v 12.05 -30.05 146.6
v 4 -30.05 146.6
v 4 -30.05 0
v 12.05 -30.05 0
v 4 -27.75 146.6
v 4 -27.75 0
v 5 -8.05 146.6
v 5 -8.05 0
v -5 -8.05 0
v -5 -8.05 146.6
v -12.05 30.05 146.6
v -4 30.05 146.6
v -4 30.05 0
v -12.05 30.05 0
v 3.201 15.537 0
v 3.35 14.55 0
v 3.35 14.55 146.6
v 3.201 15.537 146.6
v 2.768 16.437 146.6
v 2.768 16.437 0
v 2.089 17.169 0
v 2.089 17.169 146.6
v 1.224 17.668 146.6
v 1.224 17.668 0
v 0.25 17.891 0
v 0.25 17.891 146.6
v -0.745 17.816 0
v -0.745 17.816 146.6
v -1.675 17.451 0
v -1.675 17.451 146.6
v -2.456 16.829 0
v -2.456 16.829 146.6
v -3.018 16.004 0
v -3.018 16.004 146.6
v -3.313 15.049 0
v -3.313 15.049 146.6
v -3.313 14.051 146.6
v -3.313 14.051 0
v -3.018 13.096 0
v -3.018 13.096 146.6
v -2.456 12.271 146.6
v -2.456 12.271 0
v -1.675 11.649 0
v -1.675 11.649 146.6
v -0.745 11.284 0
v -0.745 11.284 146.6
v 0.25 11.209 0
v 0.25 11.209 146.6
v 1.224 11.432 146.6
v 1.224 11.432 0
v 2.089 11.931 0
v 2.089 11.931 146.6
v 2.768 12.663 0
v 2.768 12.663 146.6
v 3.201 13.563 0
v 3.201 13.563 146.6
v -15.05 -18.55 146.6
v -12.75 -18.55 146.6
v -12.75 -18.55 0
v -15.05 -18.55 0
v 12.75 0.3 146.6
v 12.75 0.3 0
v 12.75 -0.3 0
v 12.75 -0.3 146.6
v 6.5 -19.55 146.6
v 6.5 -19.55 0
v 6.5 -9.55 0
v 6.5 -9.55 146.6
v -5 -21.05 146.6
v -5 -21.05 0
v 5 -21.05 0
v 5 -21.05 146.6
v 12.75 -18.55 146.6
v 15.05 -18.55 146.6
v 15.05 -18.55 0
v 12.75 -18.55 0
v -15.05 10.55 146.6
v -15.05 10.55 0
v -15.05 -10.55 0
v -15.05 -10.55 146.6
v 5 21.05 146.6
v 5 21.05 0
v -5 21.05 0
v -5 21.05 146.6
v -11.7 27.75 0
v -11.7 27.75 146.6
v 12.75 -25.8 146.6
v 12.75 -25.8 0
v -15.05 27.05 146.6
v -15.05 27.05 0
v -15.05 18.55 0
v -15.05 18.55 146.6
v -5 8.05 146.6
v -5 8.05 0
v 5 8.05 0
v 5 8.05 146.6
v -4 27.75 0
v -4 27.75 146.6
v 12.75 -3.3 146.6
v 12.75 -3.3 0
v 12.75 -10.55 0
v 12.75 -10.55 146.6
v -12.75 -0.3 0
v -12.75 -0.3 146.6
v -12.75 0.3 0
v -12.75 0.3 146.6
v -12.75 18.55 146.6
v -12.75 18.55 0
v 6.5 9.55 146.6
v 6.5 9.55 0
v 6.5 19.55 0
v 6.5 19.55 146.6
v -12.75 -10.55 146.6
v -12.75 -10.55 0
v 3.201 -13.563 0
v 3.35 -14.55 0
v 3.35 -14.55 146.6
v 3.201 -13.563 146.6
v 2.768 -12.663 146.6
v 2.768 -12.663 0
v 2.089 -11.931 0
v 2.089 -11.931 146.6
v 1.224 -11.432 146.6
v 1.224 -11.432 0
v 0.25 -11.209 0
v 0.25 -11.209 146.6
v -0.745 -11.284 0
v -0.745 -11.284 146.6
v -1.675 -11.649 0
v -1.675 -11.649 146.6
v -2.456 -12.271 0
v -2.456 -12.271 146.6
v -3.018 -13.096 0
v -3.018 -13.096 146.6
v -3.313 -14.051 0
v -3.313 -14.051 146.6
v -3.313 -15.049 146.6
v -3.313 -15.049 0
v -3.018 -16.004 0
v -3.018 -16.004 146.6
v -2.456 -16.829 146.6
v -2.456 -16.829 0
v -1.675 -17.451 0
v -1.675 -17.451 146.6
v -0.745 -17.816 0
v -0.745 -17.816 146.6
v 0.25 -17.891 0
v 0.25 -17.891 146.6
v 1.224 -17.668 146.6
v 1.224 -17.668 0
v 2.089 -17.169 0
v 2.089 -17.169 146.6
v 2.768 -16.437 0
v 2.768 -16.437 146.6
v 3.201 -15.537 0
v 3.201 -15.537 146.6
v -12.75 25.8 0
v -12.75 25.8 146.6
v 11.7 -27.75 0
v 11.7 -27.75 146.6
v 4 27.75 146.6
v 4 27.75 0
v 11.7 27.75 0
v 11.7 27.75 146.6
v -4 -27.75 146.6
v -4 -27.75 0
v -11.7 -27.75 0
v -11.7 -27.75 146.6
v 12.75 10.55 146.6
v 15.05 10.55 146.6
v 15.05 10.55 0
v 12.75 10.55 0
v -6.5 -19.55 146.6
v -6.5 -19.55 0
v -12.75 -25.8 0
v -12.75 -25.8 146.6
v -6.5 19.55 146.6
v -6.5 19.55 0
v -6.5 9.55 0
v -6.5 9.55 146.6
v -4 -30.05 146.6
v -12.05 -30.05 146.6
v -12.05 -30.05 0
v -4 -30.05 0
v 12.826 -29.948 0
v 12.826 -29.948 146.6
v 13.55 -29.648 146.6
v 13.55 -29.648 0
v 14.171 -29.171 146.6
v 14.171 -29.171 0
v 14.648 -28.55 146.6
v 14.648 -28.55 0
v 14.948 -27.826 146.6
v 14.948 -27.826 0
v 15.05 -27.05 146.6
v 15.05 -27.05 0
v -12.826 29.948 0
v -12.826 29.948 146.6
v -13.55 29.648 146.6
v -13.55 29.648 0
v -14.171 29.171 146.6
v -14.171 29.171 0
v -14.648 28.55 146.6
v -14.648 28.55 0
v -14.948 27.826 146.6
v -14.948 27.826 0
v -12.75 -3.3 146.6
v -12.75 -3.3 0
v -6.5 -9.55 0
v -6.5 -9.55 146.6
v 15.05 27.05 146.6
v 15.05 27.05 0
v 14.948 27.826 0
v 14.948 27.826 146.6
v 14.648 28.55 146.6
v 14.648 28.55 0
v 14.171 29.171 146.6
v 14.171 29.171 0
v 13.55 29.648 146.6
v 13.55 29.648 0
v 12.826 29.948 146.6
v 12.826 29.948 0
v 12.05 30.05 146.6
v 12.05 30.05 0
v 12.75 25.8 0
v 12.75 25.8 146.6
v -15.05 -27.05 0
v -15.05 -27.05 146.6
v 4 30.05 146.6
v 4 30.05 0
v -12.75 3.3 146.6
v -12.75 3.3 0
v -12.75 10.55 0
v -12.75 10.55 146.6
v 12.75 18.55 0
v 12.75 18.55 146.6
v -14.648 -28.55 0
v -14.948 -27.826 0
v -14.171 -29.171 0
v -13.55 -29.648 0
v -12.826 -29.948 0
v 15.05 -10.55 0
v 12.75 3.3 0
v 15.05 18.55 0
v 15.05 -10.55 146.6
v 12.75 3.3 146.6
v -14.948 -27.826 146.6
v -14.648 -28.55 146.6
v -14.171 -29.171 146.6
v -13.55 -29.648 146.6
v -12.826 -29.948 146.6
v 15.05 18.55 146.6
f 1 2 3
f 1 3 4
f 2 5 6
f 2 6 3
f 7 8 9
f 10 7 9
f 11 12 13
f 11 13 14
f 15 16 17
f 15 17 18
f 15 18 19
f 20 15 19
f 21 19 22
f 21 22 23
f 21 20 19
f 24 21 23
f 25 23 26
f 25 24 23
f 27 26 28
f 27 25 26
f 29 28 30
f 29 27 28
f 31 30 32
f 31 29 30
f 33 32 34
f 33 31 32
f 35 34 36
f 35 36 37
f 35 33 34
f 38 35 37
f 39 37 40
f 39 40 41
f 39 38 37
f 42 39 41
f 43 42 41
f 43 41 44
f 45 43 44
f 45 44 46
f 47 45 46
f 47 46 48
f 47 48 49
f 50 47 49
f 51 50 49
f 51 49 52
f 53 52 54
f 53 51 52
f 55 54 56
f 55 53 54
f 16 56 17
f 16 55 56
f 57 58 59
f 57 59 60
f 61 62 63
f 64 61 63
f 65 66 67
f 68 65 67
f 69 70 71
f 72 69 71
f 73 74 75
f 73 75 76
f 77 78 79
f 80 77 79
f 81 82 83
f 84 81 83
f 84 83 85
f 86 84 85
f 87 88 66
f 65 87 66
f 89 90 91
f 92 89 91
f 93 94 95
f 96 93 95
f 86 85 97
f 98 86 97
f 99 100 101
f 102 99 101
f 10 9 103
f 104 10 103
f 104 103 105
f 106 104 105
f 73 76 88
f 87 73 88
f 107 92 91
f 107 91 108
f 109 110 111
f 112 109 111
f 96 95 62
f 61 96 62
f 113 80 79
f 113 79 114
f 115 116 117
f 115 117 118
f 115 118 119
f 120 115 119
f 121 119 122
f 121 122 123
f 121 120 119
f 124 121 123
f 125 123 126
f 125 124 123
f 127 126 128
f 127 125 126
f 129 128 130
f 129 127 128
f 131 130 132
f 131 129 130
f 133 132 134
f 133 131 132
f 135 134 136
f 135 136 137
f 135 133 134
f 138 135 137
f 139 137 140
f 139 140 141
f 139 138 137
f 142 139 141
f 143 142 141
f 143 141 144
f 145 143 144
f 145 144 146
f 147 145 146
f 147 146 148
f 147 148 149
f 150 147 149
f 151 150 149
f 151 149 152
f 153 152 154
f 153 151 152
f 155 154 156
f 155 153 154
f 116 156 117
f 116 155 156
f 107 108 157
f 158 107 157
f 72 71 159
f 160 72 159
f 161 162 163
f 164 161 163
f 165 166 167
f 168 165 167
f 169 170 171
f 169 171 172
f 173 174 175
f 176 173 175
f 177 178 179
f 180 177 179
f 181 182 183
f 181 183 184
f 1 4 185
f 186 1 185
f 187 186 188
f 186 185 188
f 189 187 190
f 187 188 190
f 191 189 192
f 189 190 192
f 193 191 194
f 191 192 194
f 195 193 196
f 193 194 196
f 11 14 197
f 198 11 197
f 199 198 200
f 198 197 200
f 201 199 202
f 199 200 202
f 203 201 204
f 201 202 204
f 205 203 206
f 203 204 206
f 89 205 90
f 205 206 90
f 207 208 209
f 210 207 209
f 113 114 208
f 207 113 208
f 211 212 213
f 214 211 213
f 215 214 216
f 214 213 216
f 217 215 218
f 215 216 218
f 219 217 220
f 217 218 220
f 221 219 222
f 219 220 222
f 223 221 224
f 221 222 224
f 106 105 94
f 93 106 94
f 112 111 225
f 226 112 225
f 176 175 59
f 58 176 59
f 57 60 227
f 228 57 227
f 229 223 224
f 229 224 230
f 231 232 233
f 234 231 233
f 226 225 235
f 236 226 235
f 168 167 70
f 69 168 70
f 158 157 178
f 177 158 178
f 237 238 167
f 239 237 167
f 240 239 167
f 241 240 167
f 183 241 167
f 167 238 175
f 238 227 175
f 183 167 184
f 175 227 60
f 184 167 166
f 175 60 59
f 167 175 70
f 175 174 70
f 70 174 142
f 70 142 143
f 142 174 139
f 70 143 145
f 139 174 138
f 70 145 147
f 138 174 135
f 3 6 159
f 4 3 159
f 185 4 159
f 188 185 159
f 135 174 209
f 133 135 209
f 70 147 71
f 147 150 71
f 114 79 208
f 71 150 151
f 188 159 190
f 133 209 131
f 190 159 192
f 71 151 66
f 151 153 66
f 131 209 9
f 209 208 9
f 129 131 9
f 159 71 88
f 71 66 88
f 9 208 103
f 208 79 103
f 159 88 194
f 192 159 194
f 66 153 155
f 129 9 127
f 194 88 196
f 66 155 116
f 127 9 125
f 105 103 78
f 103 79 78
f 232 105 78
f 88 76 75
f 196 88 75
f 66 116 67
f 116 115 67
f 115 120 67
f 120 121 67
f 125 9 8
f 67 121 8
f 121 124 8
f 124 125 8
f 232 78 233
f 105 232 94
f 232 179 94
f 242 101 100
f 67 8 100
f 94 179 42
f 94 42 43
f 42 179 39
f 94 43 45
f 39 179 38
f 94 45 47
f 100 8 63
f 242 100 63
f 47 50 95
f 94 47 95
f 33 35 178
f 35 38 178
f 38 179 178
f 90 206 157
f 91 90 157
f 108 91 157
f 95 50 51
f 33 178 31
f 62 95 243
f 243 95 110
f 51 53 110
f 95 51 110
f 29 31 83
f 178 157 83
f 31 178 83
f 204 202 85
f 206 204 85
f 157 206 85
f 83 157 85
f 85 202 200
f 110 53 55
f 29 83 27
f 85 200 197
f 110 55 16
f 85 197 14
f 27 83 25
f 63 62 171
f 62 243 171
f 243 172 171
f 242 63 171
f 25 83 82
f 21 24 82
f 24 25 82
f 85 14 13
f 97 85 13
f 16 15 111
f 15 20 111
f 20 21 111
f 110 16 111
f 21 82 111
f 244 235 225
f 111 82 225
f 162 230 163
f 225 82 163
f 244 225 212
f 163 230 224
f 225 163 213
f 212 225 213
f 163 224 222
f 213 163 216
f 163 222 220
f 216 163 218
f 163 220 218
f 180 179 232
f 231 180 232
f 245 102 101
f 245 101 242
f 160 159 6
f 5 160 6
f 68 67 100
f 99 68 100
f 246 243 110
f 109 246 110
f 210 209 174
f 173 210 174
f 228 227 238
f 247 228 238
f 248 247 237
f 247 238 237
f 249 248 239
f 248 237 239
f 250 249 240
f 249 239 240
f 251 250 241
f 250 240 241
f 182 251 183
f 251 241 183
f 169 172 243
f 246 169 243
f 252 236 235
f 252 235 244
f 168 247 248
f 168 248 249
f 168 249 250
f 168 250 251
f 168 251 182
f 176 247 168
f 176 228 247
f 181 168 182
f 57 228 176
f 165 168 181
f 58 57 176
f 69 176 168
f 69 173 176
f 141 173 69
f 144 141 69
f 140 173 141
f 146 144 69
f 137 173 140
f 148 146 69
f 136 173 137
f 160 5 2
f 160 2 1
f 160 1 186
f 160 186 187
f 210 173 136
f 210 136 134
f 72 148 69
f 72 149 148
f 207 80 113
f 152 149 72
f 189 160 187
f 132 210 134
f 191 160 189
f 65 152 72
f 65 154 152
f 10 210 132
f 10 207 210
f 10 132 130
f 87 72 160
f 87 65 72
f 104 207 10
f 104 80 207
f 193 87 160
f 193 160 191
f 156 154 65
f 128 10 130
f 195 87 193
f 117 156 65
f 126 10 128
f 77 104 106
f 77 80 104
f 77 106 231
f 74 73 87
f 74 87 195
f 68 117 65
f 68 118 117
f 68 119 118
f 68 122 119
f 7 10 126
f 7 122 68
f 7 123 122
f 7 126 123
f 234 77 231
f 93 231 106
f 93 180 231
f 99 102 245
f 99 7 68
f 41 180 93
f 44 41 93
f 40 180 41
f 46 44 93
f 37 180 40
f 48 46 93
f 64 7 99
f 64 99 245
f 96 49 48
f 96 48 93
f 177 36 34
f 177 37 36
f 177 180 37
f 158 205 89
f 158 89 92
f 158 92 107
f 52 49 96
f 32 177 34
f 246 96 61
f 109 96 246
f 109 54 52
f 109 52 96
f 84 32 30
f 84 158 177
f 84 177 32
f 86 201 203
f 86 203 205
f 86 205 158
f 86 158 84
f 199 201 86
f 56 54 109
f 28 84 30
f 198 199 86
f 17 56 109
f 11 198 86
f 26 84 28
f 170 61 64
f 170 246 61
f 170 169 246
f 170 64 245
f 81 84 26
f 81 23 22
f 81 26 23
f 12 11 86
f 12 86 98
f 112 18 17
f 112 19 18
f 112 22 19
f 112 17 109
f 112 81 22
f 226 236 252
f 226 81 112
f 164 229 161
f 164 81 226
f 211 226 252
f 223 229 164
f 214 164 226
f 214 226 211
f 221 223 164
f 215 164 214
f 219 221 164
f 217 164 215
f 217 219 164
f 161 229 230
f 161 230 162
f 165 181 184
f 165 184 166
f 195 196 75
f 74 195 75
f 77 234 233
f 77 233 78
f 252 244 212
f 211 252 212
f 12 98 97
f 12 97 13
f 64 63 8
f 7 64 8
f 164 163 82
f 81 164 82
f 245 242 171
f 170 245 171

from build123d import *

# Parameters (mm, degrees)
CROQUIS1_R              = 3.35
SALIENTE_EXTRUIR1_DEPTH = 146.6


with BuildPart() as part:
    # Croquis1 → Saliente-Extruir1 (new body)
    with BuildSketch(Plane.XY):
        with BuildLine():
            Line((-12.05, -30.05), (-4, -30.05))
            Line((-4, -30.05), (-4, -27.75))
            Line((-4, -27.75), (-11.7, -27.75))
            Line((-11.7, -27.75), (-5, -21.05))
            Line((-5, -21.05), (5, -21.05))
            Line((5, -21.05), (11.7, -27.75))
            Line((11.7, -27.75), (4, -27.75))
            Line((4, -27.75), (4, -30.05))
            Line((4, -30.05), (12.05, -30.05))
            ThreePointArc((12.05, -30.05), (14.171320344, -29.171320344), (15.05, -27.05))
            Line((15.05, -27.05), (15.05, -18.55))
            Line((15.05, -18.55), (12.75, -18.55))
            Line((12.75, -18.55), (12.75, -25.8))
            Line((12.75, -25.8), (6.5, -19.55))
            Line((6.5, -19.55), (6.5, -9.55))
            Line((6.5, -9.55), (12.75, -3.3))
            Line((12.75, -3.3), (12.75, -10.55))
            Line((12.75, -10.55), (15.05, -10.55))
            Line((15.05, -10.55), (15.05, 10.55))
            Line((15.05, 10.55), (12.75, 10.55))
            Line((12.75, 10.55), (12.75, 3.3))
            Line((12.75, 3.3), (6.5, 9.55))
            Line((6.5, 9.55), (6.5, 19.55))
            Line((6.5, 19.55), (12.75, 25.8))
            Line((12.75, 25.8), (12.75, 18.55))
            Line((12.75, 18.55), (15.05, 18.55))
            Line((15.05, 18.55), (15.05, 27.05))
            ThreePointArc((15.05, 27.05), (14.171320344, 29.171320344), (12.05, 30.05))
            Line((12.05, 30.05), (4, 30.05))
            Line((4, 30.05), (4, 27.75))
            Line((4, 27.75), (11.7, 27.75))
            Line((11.7, 27.75), (5, 21.05))
            Line((5, 21.05), (-5, 21.05))
            Line((-5, 21.05), (-11.7, 27.75))
            Line((-11.7, 27.75), (-4, 27.75))
            Line((-4, 27.75), (-4, 30.05))
            Line((-4, 30.05), (-12.05, 30.05))
            ThreePointArc((-12.05, 30.05), (-14.171320344, 29.171320344), (-15.05, 27.05))
            Line((-15.05, 27.05), (-15.05, 18.55))
            Line((-15.05, 18.55), (-12.75, 18.55))
            Line((-12.75, 18.55), (-12.75, 25.8))
            Line((-12.75, 25.8), (-6.5, 19.55))
            Line((-6.5, 19.55), (-6.5, 9.55))
            Line((-6.5, 9.55), (-12.75, 3.3))
            Line((-12.75, 3.3), (-12.75, 10.55))
            Line((-12.75, 10.55), (-15.05, 10.55))
            Line((-15.05, 10.55), (-15.05, -10.55))
            Line((-15.05, -10.55), (-12.75, -10.55))
            Line((-12.75, -10.55), (-12.75, -3.3))
            Line((-12.75, -3.3), (-6.5, -9.55))
            Line((-6.5, -9.55), (-6.5, -19.55))
            Line((-6.5, -19.55), (-12.75, -25.8))
            Line((-12.75, -25.8), (-12.75, -18.55))
            Line((-12.75, -18.55), (-15.05, -18.55))
            Line((-15.05, -18.55), (-15.05, -27.05))
            ThreePointArc((-15.05, -27.05), (-14.171320344, -29.171320344), (-12.05, -30.05))
        make_face()
        with Locations((0, 14.55)):
            Circle(CROQUIS1_R, mode=Mode.SUBTRACT)
        with Locations((0, -14.55)):
            Circle(CROQUIS1_R, mode=Mode.SUBTRACT)
        Polygon((-5, 8.05), (5, 8.05), (11.7, 1.35), (12.75, 0.3), (12.75, -0.3), (11.7, -1.35), (5, -8.05), (-5, -8.05), (-11.7, -1.35), (-12.75, -0.3), (-12.75, 0.3), (-11.7, 1.35), align=None, mode=Mode.SUBTRACT)
    extrude(amount=SALIENTE_EXTRUIR1_DEPTH)


solid = part.part
